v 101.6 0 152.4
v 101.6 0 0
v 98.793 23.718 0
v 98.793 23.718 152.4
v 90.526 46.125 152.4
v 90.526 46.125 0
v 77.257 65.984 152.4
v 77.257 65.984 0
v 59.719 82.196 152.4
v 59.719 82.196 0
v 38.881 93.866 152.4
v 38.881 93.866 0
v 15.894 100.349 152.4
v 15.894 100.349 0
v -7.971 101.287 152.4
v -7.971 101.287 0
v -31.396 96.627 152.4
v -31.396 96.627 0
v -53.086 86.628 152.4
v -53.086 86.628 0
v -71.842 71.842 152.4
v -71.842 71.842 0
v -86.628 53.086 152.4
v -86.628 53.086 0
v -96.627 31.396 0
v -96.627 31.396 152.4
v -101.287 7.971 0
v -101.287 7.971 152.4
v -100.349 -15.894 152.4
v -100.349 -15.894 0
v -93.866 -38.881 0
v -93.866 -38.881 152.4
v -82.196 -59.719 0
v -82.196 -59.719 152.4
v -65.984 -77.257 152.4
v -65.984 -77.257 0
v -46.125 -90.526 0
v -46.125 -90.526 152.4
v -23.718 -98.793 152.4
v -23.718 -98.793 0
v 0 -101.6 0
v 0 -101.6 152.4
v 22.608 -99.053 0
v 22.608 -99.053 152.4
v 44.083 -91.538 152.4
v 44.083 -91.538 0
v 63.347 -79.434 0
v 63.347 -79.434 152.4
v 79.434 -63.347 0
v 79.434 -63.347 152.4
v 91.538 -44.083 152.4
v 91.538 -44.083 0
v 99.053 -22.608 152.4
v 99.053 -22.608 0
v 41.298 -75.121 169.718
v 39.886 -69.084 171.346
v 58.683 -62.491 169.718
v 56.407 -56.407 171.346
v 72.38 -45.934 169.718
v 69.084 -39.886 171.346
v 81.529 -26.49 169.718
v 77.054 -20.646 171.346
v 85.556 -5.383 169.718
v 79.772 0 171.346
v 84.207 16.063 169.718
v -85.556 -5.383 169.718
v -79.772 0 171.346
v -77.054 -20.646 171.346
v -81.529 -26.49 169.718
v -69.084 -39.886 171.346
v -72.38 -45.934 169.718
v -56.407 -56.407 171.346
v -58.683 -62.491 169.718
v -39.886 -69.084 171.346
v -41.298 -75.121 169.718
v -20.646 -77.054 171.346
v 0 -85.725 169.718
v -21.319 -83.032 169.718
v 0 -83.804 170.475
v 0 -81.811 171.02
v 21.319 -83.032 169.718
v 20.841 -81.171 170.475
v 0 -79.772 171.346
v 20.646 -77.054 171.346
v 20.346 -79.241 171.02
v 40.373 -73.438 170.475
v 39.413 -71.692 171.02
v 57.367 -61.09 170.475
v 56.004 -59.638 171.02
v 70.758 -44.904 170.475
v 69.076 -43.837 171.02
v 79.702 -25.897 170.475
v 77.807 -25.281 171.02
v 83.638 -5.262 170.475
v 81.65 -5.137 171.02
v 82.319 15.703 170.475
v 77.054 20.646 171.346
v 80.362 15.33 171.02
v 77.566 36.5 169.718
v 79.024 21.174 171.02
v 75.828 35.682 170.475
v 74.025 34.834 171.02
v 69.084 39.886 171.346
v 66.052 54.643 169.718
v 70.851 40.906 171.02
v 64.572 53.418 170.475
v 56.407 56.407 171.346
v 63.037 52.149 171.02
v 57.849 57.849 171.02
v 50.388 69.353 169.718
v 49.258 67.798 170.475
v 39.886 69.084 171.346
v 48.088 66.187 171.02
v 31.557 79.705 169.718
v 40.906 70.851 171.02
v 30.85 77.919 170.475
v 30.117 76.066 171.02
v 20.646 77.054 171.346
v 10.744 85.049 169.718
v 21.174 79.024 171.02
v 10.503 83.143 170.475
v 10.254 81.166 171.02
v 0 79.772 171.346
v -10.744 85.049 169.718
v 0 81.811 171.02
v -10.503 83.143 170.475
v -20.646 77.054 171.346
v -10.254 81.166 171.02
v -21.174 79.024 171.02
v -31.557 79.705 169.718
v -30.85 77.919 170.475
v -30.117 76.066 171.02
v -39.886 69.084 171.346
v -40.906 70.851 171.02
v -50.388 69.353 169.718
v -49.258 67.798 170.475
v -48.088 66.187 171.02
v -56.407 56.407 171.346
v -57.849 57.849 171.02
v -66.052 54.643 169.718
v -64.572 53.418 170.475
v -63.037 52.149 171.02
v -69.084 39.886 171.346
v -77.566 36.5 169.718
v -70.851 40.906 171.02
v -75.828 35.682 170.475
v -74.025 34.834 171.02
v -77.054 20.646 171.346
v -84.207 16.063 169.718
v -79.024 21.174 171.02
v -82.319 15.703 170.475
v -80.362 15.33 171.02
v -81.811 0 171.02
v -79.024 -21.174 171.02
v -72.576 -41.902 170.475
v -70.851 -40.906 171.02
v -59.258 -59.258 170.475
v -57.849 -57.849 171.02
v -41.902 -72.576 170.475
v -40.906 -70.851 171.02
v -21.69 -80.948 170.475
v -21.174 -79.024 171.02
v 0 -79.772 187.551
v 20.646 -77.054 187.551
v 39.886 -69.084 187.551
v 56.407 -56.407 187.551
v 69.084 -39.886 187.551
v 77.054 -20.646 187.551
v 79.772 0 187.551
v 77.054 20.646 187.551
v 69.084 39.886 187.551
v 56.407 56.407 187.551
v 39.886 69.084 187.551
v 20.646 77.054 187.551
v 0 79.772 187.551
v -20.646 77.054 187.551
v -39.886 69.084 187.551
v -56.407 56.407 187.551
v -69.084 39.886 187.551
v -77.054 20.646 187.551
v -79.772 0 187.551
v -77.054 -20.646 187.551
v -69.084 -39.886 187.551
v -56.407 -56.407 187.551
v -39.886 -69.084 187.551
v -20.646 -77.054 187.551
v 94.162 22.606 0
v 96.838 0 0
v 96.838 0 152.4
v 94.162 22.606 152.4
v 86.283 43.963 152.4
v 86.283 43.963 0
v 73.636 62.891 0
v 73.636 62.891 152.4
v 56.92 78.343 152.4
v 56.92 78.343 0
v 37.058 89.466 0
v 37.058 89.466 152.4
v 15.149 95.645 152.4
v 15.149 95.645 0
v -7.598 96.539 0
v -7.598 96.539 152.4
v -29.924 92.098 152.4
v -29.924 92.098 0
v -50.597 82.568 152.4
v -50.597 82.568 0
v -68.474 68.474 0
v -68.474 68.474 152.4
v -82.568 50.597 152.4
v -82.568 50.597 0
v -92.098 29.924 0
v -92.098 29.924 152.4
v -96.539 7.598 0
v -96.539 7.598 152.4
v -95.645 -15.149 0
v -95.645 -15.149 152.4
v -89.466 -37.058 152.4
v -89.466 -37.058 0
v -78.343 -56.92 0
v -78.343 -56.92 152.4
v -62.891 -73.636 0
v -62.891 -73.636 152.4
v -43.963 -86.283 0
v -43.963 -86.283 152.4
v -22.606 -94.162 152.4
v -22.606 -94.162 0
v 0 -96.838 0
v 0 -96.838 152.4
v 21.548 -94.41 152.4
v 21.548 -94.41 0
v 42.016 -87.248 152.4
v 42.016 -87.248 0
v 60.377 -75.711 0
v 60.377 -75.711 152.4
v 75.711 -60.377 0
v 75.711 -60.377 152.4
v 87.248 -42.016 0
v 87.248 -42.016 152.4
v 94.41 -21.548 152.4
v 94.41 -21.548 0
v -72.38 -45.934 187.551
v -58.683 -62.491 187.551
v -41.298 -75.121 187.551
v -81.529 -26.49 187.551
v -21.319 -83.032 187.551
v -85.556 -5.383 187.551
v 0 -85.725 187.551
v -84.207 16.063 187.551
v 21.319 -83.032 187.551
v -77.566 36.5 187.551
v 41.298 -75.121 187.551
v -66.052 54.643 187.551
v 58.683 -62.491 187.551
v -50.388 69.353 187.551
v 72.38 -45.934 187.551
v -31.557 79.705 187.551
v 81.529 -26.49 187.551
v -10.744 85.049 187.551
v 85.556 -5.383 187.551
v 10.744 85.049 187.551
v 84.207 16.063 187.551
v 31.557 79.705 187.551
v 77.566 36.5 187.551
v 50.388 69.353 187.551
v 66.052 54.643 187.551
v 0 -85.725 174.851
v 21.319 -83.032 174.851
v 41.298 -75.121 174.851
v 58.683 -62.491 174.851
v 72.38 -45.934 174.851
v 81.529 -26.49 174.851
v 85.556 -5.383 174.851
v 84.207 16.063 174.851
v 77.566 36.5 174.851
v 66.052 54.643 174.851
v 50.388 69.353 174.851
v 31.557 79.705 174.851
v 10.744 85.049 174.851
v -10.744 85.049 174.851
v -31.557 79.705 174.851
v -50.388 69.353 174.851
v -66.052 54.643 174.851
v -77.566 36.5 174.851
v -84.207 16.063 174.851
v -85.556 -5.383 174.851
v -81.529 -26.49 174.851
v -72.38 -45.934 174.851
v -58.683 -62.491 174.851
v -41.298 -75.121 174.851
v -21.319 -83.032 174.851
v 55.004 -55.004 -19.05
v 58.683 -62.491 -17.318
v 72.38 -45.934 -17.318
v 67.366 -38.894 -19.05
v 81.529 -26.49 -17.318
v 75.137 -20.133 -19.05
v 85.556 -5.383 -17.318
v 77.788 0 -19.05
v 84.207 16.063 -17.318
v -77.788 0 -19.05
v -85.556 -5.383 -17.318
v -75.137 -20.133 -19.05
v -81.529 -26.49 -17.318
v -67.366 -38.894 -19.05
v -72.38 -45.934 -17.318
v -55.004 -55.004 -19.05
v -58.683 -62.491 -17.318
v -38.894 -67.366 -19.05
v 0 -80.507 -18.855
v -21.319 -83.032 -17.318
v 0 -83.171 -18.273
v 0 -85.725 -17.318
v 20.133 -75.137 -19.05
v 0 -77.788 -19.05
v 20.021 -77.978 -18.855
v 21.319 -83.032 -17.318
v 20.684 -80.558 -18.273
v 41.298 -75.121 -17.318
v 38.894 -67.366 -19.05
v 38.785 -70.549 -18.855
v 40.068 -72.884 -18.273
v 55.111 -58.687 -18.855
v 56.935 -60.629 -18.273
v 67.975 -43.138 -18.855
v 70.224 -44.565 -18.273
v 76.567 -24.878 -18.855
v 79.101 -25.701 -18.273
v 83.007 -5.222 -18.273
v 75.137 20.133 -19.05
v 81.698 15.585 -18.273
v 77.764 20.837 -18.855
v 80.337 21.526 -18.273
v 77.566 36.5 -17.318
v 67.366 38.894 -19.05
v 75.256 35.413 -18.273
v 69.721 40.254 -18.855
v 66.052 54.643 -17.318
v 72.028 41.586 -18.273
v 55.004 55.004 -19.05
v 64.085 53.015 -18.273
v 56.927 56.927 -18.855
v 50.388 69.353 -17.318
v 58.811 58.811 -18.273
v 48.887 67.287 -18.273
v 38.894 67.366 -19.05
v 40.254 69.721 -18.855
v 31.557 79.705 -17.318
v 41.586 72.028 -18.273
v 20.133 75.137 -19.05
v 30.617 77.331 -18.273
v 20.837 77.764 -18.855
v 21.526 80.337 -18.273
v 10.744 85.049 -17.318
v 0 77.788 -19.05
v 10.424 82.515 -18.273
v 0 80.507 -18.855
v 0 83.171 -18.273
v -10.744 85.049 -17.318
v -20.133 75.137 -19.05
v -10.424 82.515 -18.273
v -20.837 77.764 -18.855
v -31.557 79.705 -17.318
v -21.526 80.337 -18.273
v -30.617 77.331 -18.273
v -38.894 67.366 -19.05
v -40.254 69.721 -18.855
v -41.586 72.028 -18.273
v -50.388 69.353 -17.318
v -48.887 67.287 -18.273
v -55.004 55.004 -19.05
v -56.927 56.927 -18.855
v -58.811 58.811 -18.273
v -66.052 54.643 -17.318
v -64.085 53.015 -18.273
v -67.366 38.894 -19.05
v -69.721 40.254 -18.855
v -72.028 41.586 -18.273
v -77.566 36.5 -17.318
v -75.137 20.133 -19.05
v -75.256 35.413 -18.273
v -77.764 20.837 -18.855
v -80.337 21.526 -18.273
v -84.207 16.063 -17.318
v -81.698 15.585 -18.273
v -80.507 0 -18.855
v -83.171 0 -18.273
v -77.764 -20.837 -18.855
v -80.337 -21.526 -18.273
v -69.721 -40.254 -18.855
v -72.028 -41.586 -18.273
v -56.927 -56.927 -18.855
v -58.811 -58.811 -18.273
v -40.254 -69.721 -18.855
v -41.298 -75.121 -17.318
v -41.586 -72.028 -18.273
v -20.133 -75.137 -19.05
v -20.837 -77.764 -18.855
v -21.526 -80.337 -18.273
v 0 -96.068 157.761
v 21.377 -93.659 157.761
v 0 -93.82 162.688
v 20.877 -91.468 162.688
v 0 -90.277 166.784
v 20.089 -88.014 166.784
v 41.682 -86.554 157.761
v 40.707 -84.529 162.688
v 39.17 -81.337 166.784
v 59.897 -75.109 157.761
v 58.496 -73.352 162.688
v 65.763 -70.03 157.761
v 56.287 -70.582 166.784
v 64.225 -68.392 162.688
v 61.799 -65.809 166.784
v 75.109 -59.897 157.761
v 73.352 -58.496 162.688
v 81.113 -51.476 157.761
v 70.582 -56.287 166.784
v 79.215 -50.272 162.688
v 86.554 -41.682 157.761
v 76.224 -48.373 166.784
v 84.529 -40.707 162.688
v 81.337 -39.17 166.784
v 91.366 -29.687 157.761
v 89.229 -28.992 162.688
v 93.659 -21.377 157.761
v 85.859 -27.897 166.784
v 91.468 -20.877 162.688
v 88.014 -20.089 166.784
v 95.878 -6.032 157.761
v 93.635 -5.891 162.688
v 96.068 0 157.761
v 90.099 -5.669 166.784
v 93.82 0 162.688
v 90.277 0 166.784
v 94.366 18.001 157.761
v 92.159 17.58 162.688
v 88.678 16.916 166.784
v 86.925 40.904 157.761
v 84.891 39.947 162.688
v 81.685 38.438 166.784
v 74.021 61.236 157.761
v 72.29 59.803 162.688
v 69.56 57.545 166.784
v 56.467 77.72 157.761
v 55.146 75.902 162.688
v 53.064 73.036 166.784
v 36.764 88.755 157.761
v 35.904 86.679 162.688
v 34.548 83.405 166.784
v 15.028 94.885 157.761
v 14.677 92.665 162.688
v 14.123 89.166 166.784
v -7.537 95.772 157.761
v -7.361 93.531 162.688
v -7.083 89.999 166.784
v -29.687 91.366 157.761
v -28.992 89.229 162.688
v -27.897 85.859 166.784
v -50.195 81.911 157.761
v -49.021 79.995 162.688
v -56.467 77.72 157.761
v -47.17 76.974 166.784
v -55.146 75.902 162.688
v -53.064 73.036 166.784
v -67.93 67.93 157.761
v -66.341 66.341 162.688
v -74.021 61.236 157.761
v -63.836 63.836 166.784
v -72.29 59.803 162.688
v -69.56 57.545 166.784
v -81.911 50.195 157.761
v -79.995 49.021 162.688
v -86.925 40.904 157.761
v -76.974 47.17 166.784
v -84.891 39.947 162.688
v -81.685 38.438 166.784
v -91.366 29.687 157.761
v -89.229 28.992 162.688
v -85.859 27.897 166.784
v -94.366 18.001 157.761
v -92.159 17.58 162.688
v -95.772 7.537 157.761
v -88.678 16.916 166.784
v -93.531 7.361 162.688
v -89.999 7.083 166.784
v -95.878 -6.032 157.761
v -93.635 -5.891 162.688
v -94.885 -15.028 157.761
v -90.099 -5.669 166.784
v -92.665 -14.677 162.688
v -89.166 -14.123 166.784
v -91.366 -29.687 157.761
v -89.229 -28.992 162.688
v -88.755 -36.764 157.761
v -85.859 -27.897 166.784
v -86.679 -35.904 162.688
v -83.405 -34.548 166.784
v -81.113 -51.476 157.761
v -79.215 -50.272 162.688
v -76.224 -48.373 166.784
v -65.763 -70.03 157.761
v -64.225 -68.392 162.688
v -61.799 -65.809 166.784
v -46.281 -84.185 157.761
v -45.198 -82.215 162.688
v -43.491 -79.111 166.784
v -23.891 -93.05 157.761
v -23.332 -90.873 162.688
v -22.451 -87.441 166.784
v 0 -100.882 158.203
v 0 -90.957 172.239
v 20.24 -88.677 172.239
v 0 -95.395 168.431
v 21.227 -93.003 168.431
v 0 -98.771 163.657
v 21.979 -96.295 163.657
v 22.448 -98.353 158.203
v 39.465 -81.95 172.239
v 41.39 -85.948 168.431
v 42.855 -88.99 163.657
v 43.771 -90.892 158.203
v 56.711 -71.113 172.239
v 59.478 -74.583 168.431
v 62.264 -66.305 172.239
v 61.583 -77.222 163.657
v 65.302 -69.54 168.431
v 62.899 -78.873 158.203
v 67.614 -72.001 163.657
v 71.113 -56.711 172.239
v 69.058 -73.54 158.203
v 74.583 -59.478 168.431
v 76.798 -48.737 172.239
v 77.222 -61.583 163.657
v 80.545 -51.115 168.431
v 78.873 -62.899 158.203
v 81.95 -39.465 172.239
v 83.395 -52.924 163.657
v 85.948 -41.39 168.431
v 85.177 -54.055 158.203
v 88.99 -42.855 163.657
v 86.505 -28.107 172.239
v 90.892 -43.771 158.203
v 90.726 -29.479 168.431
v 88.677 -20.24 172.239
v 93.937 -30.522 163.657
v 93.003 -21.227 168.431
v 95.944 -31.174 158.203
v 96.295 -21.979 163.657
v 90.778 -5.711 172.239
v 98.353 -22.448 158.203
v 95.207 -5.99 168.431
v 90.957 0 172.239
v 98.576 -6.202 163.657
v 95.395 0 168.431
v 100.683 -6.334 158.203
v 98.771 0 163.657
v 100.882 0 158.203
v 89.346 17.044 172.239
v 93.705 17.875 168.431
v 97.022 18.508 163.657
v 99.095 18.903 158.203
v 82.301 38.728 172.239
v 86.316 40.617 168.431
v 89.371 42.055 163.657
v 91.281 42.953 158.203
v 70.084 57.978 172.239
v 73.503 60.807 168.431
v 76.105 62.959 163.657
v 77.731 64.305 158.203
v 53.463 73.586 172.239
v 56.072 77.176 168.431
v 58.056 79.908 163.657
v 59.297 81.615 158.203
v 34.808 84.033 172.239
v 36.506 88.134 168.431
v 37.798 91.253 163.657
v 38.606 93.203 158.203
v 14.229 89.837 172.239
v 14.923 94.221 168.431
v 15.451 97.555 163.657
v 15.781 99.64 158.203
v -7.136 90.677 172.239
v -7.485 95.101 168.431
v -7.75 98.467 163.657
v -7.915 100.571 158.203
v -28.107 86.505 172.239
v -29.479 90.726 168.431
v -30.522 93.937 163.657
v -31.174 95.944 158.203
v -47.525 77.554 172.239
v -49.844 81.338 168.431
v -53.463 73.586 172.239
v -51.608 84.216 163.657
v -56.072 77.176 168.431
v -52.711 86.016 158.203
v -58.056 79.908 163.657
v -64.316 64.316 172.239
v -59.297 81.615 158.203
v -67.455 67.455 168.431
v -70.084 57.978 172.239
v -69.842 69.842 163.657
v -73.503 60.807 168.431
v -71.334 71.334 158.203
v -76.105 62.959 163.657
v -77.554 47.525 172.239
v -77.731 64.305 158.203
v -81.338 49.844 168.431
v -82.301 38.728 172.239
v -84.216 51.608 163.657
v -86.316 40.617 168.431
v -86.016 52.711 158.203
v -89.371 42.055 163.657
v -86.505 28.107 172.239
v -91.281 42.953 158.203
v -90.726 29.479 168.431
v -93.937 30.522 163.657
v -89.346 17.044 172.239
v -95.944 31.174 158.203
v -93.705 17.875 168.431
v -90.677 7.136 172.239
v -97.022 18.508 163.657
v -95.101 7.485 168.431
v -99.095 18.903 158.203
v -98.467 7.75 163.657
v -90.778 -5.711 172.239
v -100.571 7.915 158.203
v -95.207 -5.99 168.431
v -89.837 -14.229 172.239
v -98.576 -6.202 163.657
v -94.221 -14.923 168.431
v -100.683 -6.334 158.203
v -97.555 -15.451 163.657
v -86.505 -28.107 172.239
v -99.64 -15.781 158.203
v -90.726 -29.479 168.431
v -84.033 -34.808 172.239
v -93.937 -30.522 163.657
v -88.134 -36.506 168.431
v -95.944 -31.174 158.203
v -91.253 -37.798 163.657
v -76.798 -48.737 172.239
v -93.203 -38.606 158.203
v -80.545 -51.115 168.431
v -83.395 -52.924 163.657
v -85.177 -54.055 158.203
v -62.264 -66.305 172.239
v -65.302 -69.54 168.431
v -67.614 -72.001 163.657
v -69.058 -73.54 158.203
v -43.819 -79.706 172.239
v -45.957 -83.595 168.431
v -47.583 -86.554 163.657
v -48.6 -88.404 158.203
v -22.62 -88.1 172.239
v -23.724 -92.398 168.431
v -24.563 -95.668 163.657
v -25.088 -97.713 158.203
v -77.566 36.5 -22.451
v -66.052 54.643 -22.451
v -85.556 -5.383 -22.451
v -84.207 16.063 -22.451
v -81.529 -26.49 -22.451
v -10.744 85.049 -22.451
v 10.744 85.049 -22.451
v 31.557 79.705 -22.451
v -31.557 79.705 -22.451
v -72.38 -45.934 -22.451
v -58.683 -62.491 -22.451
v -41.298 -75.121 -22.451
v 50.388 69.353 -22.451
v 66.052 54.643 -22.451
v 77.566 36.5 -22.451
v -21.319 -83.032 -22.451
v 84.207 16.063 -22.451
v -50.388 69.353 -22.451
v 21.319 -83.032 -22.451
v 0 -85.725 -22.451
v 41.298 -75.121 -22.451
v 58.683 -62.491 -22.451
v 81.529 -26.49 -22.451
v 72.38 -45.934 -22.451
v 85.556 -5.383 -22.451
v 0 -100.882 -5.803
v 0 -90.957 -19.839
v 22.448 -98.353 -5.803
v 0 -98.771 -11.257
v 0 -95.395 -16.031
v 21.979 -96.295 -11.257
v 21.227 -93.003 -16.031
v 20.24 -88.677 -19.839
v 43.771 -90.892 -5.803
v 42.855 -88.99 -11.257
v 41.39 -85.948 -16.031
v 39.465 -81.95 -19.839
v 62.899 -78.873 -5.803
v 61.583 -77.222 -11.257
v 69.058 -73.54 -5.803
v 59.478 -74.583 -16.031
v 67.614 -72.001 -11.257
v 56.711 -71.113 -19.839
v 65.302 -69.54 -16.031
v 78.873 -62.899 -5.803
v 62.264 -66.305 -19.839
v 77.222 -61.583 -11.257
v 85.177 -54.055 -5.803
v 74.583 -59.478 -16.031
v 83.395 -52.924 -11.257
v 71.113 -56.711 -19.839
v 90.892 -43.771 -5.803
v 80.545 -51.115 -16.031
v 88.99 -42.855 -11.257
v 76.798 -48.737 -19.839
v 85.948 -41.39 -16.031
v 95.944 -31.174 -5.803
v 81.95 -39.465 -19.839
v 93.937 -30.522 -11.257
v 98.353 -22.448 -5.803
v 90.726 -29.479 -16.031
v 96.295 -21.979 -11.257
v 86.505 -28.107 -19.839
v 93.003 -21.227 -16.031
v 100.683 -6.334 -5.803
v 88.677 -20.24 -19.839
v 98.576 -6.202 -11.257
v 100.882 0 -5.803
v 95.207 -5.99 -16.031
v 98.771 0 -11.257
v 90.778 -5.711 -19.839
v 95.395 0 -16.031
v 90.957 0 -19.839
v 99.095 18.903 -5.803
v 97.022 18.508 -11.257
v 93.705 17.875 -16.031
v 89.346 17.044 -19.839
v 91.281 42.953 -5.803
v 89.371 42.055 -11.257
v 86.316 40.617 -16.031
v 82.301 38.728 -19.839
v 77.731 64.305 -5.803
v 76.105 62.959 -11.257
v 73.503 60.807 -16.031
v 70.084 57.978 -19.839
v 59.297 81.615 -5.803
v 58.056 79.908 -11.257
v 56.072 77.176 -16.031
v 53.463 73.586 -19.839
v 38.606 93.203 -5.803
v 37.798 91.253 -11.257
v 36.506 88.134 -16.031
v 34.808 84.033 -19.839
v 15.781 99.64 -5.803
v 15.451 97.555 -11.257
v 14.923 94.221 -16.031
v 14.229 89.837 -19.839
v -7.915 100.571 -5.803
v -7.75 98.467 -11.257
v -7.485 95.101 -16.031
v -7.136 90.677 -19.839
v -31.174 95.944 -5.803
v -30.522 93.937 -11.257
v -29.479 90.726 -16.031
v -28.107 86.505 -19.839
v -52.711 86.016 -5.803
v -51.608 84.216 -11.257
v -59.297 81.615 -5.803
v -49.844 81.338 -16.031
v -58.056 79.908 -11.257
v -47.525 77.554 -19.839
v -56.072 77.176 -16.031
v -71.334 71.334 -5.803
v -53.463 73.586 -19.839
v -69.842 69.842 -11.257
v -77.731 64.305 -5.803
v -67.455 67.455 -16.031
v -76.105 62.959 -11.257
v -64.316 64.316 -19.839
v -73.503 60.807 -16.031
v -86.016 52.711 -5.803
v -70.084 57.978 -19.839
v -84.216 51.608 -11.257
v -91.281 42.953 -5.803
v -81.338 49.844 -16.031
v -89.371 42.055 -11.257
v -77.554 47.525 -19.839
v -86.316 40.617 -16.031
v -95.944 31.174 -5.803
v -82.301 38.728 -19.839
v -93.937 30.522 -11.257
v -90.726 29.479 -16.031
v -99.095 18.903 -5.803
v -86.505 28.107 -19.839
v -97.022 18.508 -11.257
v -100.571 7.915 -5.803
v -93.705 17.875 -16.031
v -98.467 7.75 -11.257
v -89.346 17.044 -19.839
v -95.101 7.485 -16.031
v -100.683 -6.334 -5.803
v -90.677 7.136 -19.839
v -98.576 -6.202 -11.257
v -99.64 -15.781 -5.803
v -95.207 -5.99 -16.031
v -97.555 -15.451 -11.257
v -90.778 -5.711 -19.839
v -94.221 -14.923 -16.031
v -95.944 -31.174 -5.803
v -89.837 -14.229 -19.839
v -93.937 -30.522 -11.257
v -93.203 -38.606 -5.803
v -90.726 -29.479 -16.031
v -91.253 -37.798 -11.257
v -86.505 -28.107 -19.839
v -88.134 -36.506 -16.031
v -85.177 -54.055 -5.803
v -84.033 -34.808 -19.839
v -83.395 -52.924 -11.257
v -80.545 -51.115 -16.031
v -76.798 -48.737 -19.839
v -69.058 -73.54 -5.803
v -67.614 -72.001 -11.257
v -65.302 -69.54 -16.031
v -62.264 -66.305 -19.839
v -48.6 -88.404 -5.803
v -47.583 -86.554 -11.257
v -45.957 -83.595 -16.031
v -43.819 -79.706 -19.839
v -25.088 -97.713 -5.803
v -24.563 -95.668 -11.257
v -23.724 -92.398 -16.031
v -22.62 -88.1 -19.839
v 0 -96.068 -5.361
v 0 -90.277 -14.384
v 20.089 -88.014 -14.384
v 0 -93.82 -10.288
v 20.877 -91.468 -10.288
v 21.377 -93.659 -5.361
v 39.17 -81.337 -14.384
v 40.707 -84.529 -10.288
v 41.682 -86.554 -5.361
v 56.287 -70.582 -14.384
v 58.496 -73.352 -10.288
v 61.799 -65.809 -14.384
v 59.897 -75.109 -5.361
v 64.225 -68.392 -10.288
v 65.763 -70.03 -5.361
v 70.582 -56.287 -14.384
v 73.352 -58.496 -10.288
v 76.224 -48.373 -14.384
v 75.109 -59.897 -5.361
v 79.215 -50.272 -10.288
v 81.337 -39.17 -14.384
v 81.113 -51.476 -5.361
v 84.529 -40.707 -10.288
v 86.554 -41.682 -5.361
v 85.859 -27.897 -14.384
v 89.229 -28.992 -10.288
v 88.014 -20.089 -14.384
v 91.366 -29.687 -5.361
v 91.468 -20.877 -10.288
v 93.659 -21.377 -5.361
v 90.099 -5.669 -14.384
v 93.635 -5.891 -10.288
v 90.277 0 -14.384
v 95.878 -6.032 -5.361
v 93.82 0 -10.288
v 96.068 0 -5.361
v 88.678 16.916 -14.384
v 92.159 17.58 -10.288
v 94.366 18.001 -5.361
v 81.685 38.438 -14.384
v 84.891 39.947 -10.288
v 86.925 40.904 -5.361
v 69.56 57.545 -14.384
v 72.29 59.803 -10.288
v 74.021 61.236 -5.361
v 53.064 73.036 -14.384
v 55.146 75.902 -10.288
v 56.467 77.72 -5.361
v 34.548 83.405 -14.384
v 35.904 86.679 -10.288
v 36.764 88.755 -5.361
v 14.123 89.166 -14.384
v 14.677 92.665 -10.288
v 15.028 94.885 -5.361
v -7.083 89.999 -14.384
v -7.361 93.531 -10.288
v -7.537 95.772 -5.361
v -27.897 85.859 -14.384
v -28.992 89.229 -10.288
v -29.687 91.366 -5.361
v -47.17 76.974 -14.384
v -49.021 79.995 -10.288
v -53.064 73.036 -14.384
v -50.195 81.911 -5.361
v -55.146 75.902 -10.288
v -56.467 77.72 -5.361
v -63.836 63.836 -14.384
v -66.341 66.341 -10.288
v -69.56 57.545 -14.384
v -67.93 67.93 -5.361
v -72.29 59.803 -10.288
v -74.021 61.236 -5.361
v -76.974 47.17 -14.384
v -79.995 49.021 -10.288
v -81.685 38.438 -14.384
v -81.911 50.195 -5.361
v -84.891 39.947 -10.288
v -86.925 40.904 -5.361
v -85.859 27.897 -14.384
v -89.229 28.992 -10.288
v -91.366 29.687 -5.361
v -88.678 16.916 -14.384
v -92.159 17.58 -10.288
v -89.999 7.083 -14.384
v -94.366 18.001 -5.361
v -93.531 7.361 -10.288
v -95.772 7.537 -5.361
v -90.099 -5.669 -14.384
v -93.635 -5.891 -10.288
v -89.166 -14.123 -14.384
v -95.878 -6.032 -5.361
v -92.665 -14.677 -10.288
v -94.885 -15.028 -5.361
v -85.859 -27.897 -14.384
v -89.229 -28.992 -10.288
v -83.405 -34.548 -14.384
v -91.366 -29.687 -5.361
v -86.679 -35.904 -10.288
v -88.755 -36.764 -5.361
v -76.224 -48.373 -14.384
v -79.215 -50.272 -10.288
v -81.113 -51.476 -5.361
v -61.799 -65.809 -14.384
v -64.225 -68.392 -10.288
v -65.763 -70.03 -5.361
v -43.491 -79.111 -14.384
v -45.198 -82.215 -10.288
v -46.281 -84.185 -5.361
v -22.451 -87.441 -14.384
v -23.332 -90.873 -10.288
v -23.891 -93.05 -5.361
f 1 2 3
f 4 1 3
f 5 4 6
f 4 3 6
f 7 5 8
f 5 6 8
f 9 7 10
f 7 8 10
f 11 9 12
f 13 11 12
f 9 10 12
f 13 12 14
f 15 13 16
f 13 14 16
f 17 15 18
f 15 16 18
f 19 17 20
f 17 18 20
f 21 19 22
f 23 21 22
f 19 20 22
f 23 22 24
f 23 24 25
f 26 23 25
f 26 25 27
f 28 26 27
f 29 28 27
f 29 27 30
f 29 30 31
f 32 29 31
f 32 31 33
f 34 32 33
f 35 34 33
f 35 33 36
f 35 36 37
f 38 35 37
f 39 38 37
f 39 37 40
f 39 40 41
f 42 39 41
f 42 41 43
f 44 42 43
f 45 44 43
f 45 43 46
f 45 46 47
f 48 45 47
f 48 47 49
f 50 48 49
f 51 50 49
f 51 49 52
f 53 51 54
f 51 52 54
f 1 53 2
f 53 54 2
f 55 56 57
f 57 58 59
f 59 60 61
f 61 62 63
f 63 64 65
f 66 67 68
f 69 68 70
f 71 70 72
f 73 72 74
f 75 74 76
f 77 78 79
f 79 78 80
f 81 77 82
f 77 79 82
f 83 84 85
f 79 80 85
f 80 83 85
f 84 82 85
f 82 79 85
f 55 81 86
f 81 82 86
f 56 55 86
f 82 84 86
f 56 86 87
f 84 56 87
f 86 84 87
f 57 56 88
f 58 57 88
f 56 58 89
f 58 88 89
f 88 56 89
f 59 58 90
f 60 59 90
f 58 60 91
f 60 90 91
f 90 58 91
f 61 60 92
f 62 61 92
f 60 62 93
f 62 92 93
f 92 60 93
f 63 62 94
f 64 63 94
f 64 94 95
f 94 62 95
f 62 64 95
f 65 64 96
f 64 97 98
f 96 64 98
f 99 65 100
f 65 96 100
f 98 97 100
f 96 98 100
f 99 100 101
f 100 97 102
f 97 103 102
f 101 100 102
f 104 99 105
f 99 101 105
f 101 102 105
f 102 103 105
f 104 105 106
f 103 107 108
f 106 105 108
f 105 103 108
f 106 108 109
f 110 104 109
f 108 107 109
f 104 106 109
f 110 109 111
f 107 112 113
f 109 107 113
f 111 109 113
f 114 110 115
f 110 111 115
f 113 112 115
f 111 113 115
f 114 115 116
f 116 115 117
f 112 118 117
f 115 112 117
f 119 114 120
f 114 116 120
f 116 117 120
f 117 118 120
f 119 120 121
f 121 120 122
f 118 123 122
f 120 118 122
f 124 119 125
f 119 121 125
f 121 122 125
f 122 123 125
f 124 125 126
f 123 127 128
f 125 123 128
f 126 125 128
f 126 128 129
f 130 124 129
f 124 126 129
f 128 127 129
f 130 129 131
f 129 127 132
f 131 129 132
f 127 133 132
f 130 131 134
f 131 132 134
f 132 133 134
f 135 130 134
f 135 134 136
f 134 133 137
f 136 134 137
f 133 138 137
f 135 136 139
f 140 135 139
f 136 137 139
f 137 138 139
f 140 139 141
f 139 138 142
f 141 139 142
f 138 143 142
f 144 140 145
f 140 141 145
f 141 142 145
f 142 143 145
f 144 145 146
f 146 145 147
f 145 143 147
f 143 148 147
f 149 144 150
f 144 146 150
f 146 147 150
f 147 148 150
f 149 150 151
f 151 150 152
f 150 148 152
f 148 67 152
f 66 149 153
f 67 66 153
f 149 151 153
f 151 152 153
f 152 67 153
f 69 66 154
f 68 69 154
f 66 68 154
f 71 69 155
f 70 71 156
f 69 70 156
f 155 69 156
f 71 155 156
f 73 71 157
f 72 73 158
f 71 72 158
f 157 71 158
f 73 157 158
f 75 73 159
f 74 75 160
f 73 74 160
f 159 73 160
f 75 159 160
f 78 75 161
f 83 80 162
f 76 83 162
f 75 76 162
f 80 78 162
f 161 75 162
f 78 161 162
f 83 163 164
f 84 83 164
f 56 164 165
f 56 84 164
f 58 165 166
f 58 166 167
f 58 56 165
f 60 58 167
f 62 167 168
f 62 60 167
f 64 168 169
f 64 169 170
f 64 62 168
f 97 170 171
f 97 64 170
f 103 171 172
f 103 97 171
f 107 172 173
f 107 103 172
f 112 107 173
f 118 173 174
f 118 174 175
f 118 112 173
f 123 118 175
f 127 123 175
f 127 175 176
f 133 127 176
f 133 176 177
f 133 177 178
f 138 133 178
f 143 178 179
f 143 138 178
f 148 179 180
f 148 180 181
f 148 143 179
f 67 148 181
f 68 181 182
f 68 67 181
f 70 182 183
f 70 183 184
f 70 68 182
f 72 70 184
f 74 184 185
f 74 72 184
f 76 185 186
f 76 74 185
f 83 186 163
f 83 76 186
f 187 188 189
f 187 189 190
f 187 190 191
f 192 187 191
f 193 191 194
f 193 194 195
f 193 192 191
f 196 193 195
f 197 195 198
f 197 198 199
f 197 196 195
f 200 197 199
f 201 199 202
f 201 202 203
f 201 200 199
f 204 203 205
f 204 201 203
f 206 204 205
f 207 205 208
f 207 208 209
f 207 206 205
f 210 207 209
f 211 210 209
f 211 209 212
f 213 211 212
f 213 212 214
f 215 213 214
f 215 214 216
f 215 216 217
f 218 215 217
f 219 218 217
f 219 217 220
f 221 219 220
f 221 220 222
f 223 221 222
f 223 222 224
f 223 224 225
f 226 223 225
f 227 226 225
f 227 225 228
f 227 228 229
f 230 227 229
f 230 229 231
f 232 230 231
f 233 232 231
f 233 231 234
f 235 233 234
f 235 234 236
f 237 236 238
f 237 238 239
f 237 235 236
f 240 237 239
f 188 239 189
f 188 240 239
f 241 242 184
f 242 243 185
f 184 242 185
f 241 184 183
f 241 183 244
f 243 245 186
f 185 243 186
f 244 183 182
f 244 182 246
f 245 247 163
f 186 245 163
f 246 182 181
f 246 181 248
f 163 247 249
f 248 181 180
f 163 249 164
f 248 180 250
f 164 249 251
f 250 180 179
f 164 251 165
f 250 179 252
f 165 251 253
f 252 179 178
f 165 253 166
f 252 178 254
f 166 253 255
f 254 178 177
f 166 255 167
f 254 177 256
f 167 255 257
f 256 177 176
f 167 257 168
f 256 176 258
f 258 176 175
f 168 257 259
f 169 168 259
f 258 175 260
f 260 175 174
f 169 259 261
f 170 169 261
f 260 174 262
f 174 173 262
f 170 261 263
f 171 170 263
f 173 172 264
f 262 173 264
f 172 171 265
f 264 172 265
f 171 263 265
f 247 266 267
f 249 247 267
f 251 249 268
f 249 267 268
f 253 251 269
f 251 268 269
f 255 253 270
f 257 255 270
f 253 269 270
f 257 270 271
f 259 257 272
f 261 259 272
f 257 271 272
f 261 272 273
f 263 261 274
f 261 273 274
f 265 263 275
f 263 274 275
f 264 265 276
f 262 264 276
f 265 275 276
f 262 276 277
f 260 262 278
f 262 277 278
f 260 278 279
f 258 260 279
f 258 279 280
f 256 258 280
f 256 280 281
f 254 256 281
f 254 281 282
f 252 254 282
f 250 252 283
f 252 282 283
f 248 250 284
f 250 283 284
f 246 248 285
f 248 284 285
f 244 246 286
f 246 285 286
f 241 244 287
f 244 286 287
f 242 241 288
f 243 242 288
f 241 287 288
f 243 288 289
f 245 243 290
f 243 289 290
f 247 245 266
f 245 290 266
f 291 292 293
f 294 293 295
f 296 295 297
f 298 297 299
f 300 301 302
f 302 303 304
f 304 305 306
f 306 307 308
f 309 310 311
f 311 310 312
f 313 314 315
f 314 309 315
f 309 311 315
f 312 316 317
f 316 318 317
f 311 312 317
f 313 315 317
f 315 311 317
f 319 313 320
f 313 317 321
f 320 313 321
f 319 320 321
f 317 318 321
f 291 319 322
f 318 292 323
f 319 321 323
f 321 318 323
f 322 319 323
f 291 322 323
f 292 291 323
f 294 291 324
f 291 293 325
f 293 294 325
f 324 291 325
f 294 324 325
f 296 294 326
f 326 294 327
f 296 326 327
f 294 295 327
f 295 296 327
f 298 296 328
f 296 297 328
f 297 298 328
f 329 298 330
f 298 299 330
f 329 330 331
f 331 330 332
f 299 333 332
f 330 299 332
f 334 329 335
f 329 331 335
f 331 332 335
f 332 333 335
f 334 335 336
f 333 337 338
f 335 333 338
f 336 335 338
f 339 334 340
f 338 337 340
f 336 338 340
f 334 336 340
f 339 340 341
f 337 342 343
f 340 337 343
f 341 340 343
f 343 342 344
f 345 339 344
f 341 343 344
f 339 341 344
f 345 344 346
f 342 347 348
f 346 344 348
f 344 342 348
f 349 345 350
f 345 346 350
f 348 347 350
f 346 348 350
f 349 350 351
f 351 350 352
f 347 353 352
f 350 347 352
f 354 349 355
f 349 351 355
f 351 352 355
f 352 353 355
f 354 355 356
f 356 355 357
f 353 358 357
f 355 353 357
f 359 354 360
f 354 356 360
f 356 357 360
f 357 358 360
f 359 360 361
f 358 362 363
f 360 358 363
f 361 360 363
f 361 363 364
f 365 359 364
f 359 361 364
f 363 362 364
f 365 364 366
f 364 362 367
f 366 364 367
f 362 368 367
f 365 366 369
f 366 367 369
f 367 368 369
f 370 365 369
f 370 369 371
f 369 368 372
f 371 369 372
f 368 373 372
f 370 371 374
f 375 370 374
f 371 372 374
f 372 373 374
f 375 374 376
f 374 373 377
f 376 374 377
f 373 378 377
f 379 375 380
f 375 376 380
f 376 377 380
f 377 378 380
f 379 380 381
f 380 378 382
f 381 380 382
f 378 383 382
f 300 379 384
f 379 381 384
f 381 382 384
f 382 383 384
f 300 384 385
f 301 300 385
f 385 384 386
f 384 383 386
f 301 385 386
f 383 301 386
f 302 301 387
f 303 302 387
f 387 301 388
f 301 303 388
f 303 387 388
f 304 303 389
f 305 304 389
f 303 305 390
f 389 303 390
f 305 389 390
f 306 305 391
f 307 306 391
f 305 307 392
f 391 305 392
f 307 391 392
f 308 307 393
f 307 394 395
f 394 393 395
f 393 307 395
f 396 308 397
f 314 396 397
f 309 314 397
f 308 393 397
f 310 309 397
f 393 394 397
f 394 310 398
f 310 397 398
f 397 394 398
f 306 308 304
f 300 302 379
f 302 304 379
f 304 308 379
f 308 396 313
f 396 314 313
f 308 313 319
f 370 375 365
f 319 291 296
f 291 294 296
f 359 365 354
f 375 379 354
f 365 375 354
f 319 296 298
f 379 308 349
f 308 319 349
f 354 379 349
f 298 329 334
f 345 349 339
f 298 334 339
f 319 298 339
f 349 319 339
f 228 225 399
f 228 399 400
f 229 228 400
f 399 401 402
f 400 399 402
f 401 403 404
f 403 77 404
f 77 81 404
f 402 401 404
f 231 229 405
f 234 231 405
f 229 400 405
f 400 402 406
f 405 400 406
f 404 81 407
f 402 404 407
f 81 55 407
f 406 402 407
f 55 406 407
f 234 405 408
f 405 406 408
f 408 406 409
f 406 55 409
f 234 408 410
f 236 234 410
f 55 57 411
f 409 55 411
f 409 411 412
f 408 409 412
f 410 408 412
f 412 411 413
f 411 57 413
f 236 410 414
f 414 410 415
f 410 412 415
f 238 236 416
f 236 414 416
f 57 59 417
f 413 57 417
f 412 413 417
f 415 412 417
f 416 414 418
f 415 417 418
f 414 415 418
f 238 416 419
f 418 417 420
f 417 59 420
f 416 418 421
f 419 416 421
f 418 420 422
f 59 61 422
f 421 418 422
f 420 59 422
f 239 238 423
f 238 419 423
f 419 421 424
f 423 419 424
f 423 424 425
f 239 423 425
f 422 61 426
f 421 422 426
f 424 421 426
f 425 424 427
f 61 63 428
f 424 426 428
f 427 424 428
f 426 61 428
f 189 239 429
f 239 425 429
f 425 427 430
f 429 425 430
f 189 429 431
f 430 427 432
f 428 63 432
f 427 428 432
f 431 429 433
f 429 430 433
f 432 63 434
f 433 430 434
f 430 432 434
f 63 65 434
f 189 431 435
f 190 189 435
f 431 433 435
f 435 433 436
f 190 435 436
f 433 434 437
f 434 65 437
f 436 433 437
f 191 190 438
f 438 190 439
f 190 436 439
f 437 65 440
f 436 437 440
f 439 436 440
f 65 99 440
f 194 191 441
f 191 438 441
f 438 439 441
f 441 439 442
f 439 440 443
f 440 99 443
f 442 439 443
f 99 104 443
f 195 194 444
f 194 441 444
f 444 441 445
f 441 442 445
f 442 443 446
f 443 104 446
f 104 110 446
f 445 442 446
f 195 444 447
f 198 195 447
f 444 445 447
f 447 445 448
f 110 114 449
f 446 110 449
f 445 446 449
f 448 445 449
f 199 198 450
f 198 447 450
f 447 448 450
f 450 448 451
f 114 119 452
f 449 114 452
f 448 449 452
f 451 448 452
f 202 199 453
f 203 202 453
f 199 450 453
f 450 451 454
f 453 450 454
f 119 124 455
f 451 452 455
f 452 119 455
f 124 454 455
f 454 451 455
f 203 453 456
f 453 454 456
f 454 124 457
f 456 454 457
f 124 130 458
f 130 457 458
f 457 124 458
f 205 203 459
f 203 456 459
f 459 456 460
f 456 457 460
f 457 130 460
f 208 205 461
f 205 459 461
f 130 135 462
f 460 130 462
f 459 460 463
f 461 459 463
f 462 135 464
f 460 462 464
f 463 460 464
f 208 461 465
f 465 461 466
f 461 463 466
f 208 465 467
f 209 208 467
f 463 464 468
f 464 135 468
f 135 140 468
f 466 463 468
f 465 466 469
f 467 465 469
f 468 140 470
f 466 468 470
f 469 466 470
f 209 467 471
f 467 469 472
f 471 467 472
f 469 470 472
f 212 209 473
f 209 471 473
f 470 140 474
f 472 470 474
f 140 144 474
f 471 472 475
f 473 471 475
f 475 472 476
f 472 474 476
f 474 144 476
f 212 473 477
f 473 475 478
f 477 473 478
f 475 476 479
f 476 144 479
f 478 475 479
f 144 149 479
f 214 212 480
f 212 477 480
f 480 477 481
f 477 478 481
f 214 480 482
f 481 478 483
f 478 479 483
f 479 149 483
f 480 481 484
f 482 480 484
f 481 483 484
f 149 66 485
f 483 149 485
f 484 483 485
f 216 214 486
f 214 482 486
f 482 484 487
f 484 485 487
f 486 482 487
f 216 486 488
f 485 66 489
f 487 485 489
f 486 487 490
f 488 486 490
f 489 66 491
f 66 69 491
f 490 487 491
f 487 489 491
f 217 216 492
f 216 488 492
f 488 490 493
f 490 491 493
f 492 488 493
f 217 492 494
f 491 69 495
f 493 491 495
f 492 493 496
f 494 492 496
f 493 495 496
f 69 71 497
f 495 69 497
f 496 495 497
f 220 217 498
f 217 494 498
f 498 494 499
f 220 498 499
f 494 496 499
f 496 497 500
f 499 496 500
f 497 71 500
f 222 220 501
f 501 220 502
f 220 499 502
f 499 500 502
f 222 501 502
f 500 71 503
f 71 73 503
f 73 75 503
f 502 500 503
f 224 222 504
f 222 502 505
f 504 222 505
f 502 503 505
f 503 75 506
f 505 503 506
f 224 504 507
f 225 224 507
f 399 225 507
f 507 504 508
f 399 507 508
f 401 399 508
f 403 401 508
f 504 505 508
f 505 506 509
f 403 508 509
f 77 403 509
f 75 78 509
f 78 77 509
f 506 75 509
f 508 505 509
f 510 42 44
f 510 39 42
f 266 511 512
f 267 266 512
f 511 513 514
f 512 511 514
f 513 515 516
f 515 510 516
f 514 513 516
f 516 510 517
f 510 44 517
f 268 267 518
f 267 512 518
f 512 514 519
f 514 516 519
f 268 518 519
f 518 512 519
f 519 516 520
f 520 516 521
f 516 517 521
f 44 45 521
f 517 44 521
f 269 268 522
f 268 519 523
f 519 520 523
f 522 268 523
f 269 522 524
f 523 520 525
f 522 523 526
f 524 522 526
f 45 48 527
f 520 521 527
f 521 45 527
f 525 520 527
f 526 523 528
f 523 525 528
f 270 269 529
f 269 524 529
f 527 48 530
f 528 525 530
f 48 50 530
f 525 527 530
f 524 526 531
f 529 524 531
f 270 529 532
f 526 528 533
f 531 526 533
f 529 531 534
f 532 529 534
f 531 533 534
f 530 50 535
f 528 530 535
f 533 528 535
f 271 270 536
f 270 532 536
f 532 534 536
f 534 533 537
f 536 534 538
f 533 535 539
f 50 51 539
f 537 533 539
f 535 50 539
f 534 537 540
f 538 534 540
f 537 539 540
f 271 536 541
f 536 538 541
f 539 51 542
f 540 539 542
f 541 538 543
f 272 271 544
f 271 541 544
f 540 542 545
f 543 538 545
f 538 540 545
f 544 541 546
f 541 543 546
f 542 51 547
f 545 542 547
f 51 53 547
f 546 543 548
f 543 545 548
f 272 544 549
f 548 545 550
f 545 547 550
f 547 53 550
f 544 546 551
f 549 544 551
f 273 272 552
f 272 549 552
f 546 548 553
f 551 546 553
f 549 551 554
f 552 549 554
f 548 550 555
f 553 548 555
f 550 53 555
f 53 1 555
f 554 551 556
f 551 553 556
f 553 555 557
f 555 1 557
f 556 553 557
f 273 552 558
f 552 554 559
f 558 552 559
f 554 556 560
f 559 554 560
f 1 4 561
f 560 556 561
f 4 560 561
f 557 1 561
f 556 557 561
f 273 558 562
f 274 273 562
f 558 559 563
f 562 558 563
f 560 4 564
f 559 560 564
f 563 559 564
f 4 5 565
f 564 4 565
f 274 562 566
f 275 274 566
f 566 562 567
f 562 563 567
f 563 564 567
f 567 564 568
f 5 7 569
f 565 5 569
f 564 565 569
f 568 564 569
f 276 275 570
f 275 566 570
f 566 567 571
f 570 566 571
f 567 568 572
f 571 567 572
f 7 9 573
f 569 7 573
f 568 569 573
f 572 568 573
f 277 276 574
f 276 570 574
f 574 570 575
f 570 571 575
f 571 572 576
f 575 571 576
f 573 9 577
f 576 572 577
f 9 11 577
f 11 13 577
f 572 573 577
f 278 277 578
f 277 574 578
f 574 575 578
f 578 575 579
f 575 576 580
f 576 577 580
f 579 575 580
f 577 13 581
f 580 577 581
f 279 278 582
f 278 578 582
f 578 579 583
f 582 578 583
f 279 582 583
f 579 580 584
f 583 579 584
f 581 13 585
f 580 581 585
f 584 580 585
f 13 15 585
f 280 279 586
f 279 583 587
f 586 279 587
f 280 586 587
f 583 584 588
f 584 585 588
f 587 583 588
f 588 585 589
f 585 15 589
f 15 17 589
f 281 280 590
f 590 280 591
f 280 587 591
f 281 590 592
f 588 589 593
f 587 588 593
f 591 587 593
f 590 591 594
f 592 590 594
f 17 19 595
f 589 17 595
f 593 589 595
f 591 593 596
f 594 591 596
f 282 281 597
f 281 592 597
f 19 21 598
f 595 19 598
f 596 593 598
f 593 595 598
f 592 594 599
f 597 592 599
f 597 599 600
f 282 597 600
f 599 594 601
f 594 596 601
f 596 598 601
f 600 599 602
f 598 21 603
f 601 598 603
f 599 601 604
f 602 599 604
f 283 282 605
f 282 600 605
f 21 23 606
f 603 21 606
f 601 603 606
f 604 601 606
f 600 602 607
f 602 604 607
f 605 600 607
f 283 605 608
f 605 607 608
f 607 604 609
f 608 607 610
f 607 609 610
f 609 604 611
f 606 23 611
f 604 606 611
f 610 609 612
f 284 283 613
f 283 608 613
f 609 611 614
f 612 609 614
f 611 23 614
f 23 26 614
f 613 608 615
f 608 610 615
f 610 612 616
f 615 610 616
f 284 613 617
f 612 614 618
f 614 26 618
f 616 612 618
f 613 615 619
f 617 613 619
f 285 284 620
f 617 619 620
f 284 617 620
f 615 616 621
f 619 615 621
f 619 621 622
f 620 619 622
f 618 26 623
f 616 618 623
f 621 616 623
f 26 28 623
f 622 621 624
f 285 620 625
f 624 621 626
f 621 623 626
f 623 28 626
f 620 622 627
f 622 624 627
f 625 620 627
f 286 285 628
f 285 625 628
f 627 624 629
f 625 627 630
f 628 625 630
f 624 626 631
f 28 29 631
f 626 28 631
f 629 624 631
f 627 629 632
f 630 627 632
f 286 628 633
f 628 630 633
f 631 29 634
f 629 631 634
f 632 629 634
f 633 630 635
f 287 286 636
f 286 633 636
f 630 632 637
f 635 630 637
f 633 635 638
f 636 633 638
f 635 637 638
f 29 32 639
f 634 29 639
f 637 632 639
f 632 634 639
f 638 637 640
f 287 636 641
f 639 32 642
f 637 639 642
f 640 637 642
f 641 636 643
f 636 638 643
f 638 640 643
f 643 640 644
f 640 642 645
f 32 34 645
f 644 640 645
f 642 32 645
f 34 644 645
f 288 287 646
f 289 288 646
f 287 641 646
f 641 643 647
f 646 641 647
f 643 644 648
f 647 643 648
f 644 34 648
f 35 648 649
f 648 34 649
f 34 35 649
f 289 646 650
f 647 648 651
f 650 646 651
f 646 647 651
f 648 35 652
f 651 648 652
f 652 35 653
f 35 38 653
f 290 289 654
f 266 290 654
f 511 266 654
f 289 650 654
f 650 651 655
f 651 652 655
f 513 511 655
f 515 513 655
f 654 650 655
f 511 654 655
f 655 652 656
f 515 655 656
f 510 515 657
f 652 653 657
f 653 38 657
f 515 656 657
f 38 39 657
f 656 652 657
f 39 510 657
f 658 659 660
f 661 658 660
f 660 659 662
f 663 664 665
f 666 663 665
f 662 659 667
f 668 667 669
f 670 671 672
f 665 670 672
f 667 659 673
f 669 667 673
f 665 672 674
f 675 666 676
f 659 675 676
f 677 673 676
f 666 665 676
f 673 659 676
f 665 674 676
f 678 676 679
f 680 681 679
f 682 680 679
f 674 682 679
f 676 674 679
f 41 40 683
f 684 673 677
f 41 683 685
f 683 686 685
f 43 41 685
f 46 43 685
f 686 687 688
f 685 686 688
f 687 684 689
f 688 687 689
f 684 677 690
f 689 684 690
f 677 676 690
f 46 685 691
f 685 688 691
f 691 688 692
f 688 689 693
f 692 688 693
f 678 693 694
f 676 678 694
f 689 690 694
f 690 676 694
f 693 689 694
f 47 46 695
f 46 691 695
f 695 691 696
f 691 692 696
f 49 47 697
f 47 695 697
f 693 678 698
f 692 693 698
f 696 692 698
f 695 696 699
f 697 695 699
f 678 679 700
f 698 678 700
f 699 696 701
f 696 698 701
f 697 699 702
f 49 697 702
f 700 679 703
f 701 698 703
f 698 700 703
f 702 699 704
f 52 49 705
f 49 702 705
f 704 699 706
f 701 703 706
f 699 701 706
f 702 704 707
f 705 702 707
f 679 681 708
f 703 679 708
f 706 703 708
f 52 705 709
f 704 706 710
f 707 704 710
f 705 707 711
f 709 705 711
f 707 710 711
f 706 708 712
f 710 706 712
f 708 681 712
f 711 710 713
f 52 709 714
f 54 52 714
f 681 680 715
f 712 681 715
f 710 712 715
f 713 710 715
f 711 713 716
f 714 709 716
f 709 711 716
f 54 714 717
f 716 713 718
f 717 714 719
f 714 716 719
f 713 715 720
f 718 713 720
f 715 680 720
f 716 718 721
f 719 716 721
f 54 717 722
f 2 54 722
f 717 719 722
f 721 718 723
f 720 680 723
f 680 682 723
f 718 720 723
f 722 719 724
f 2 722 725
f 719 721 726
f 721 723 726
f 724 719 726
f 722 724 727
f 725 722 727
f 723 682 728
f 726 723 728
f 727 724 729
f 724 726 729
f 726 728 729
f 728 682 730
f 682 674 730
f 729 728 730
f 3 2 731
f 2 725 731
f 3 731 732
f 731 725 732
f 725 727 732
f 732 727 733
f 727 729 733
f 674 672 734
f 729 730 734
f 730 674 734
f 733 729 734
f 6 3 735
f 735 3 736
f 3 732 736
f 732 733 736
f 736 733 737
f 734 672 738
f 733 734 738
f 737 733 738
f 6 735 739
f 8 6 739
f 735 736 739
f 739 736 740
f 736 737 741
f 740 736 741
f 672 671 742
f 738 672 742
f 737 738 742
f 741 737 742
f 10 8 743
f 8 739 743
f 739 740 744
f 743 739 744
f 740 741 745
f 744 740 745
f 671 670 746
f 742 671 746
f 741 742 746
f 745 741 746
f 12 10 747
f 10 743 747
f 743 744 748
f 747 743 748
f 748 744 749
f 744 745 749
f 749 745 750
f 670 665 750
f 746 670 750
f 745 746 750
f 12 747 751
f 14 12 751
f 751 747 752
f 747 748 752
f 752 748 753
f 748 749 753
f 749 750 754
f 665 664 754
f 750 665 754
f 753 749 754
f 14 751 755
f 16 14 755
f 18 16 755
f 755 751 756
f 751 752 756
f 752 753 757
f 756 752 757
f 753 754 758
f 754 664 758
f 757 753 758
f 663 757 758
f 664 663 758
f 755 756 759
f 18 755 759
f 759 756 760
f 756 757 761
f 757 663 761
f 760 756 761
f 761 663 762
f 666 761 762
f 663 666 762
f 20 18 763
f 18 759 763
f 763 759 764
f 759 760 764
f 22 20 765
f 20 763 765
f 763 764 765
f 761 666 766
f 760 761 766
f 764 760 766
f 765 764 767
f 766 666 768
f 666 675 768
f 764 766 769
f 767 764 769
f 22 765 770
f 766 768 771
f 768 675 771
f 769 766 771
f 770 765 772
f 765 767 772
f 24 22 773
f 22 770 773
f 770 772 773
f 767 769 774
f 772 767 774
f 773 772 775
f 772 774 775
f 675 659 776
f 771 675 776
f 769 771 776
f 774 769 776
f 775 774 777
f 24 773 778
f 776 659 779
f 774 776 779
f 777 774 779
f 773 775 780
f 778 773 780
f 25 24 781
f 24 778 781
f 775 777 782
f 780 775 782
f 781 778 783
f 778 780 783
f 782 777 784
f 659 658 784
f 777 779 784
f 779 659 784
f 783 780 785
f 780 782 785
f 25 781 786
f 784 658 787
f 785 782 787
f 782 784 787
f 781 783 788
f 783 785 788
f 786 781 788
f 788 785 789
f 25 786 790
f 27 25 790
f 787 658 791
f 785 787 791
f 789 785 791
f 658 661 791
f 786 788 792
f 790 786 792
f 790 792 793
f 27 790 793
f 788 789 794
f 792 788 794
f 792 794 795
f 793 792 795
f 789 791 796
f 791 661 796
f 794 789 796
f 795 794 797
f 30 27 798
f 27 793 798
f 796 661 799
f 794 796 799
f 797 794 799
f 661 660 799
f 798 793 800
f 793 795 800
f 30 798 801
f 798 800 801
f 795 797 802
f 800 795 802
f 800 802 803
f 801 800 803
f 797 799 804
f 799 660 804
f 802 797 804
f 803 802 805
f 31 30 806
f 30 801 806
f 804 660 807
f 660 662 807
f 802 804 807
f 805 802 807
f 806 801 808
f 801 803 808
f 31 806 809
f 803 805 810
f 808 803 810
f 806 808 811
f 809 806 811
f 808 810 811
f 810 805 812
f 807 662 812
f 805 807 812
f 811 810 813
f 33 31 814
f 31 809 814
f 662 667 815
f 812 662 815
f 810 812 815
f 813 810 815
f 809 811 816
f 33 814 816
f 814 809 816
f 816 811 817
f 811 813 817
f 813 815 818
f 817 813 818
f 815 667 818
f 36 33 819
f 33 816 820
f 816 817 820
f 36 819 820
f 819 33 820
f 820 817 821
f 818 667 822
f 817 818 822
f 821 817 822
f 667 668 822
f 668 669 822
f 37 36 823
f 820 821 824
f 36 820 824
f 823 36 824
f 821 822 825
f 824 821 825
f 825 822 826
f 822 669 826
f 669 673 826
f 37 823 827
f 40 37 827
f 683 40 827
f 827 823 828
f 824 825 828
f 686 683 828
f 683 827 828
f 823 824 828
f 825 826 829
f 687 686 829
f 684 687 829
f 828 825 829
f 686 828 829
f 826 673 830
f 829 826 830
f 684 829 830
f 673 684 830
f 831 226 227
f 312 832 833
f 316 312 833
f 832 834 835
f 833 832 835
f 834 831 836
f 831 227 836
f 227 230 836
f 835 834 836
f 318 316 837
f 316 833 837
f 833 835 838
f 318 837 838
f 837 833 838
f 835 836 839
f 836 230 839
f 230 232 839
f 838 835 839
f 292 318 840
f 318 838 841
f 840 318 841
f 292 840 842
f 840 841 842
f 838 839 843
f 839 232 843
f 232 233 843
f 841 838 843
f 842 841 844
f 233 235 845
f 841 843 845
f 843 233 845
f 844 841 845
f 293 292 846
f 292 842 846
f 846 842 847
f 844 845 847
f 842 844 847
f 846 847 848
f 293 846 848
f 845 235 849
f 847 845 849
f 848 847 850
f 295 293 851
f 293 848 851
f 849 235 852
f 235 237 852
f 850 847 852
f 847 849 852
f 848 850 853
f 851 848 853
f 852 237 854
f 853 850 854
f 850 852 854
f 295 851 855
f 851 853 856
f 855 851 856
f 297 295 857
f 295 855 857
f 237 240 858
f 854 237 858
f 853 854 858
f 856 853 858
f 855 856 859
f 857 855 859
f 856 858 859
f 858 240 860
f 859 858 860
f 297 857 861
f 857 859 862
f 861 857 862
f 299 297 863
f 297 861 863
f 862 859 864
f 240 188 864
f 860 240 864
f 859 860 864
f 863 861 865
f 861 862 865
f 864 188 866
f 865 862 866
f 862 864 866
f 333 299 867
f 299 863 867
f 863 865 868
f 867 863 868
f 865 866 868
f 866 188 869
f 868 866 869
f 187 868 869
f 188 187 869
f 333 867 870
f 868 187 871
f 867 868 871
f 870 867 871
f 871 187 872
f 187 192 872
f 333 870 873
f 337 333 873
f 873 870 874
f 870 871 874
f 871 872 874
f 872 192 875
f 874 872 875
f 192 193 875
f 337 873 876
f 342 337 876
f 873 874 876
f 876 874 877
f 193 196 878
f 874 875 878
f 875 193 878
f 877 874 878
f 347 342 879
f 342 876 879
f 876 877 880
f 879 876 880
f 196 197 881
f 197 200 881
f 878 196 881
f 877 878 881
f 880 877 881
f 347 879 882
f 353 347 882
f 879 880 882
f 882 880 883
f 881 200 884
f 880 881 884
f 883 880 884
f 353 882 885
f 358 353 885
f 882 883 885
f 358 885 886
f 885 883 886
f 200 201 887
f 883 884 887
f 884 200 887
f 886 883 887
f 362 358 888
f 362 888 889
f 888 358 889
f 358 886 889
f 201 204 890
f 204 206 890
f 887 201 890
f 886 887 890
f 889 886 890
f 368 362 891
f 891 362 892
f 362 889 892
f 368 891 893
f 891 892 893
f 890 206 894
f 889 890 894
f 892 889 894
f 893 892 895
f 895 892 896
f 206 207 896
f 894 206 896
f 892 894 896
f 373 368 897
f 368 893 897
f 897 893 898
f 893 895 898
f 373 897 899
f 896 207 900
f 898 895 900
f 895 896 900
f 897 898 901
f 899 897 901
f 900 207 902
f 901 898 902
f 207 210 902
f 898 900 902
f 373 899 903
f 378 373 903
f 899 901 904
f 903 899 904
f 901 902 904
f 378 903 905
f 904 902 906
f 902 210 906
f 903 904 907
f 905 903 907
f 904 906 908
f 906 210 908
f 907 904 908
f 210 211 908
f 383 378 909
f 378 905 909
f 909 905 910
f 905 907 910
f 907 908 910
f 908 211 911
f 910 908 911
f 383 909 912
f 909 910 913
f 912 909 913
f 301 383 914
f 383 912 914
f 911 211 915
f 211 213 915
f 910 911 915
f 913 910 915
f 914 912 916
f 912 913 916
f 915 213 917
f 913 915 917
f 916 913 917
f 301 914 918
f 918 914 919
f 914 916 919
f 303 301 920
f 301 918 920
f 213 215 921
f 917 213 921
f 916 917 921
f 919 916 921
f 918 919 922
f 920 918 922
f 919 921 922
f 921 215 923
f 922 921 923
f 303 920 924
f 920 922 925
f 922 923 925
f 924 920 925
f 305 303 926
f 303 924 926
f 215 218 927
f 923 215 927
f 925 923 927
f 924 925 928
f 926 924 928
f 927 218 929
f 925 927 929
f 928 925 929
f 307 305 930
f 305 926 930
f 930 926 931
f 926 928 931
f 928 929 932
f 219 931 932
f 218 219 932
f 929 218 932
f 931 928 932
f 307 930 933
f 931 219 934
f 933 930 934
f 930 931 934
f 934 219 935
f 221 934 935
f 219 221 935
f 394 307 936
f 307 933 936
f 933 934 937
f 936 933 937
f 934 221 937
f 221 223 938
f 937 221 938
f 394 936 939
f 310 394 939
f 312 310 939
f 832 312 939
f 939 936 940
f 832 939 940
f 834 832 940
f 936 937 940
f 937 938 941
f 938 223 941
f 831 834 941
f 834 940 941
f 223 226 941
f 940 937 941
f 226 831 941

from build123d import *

# Parameters (mm, degrees)
F0_R     = 101.6
F0_R_2   = 96.8375
F1_DEPTH = 152.4
F4_DEPTH = 12.7


with BuildPart() as f1:
    # F0 (on Top) → F1 (new body)
    with BuildSketch(Plane.XY):
        Circle(F0_R)
        Circle(F0_R_2, mode=Mode.SUBTRACT)
    extrude(amount=F1_DEPTH)

    # F2 (on Right) → F3 (revolve)
    with BuildSketch(Plane.YZ):
        with BuildLine():
            Line((-101.6, 152.4), (-96.8375, 152.4))
            ThreePointArc((-96.8375, 152.4), (-93.8204640896, 162.6881758587), (-85.725, 169.717580482))
            ThreePointArc((-85.725, 169.717580482), (-82.8148388415, 170.774666369), (-79.771875, 171.3463652414))
            Line((-79.771875, 171.3463652414), (-79.771875, 174.8506403027))
            Line((-79.771875, 174.8506403027), (-81.75625, 174.8506403027))
            Line((-81.75625, 174.8506403027), (-85.725, 174.8506403027))
            ThreePointArc((-85.725, 174.8506403027), (-97.2303248333, 166.1481532851), (-101.6, 152.4))
        make_face()
    revolve(axis=Axis((0, 0, 76.2), (0, 0, 1)))

    # F4 (add): a face of the model
    f4_faces = [f1.faces().sort_by_distance(p)[0] for p in [
        (0, 82.1965441527, 174.8506403027),
    ]]
    extrude(f4_faces, amount=F4_DEPTH)

    # F5 (on Right) → F6 (revolve)
    with BuildSketch(Plane.YZ):
        with BuildLine():
            Line((0, -22.4506403027), (0, -19.05))
            Line((0, -19.05), (-77.7875, -19.05))
            ThreePointArc((-77.7875, -19.05), (-81.8496787146, -18.6118565461), (-85.725, -17.317580482))
            ThreePointArc((-85.725, -17.317580482), (-93.8204640896, -10.2881758587), (-96.8375, 0))
            Line((-96.8375, 0), (-101.6, 0))
            ThreePointArc((-101.6, 0), (-97.2303248333, -13.7481532851), (-85.725, -22.4506403027))
            Line((-85.725, -22.4506403027), (-77.7875, -22.4506403027))
            Line((-77.7875, -22.4506403027), (0, -22.4506403027))
        make_face()
    revolve(axis=Axis((0, 0, -11.2253201513), (0, 0, 1)))


solid = f1.part
